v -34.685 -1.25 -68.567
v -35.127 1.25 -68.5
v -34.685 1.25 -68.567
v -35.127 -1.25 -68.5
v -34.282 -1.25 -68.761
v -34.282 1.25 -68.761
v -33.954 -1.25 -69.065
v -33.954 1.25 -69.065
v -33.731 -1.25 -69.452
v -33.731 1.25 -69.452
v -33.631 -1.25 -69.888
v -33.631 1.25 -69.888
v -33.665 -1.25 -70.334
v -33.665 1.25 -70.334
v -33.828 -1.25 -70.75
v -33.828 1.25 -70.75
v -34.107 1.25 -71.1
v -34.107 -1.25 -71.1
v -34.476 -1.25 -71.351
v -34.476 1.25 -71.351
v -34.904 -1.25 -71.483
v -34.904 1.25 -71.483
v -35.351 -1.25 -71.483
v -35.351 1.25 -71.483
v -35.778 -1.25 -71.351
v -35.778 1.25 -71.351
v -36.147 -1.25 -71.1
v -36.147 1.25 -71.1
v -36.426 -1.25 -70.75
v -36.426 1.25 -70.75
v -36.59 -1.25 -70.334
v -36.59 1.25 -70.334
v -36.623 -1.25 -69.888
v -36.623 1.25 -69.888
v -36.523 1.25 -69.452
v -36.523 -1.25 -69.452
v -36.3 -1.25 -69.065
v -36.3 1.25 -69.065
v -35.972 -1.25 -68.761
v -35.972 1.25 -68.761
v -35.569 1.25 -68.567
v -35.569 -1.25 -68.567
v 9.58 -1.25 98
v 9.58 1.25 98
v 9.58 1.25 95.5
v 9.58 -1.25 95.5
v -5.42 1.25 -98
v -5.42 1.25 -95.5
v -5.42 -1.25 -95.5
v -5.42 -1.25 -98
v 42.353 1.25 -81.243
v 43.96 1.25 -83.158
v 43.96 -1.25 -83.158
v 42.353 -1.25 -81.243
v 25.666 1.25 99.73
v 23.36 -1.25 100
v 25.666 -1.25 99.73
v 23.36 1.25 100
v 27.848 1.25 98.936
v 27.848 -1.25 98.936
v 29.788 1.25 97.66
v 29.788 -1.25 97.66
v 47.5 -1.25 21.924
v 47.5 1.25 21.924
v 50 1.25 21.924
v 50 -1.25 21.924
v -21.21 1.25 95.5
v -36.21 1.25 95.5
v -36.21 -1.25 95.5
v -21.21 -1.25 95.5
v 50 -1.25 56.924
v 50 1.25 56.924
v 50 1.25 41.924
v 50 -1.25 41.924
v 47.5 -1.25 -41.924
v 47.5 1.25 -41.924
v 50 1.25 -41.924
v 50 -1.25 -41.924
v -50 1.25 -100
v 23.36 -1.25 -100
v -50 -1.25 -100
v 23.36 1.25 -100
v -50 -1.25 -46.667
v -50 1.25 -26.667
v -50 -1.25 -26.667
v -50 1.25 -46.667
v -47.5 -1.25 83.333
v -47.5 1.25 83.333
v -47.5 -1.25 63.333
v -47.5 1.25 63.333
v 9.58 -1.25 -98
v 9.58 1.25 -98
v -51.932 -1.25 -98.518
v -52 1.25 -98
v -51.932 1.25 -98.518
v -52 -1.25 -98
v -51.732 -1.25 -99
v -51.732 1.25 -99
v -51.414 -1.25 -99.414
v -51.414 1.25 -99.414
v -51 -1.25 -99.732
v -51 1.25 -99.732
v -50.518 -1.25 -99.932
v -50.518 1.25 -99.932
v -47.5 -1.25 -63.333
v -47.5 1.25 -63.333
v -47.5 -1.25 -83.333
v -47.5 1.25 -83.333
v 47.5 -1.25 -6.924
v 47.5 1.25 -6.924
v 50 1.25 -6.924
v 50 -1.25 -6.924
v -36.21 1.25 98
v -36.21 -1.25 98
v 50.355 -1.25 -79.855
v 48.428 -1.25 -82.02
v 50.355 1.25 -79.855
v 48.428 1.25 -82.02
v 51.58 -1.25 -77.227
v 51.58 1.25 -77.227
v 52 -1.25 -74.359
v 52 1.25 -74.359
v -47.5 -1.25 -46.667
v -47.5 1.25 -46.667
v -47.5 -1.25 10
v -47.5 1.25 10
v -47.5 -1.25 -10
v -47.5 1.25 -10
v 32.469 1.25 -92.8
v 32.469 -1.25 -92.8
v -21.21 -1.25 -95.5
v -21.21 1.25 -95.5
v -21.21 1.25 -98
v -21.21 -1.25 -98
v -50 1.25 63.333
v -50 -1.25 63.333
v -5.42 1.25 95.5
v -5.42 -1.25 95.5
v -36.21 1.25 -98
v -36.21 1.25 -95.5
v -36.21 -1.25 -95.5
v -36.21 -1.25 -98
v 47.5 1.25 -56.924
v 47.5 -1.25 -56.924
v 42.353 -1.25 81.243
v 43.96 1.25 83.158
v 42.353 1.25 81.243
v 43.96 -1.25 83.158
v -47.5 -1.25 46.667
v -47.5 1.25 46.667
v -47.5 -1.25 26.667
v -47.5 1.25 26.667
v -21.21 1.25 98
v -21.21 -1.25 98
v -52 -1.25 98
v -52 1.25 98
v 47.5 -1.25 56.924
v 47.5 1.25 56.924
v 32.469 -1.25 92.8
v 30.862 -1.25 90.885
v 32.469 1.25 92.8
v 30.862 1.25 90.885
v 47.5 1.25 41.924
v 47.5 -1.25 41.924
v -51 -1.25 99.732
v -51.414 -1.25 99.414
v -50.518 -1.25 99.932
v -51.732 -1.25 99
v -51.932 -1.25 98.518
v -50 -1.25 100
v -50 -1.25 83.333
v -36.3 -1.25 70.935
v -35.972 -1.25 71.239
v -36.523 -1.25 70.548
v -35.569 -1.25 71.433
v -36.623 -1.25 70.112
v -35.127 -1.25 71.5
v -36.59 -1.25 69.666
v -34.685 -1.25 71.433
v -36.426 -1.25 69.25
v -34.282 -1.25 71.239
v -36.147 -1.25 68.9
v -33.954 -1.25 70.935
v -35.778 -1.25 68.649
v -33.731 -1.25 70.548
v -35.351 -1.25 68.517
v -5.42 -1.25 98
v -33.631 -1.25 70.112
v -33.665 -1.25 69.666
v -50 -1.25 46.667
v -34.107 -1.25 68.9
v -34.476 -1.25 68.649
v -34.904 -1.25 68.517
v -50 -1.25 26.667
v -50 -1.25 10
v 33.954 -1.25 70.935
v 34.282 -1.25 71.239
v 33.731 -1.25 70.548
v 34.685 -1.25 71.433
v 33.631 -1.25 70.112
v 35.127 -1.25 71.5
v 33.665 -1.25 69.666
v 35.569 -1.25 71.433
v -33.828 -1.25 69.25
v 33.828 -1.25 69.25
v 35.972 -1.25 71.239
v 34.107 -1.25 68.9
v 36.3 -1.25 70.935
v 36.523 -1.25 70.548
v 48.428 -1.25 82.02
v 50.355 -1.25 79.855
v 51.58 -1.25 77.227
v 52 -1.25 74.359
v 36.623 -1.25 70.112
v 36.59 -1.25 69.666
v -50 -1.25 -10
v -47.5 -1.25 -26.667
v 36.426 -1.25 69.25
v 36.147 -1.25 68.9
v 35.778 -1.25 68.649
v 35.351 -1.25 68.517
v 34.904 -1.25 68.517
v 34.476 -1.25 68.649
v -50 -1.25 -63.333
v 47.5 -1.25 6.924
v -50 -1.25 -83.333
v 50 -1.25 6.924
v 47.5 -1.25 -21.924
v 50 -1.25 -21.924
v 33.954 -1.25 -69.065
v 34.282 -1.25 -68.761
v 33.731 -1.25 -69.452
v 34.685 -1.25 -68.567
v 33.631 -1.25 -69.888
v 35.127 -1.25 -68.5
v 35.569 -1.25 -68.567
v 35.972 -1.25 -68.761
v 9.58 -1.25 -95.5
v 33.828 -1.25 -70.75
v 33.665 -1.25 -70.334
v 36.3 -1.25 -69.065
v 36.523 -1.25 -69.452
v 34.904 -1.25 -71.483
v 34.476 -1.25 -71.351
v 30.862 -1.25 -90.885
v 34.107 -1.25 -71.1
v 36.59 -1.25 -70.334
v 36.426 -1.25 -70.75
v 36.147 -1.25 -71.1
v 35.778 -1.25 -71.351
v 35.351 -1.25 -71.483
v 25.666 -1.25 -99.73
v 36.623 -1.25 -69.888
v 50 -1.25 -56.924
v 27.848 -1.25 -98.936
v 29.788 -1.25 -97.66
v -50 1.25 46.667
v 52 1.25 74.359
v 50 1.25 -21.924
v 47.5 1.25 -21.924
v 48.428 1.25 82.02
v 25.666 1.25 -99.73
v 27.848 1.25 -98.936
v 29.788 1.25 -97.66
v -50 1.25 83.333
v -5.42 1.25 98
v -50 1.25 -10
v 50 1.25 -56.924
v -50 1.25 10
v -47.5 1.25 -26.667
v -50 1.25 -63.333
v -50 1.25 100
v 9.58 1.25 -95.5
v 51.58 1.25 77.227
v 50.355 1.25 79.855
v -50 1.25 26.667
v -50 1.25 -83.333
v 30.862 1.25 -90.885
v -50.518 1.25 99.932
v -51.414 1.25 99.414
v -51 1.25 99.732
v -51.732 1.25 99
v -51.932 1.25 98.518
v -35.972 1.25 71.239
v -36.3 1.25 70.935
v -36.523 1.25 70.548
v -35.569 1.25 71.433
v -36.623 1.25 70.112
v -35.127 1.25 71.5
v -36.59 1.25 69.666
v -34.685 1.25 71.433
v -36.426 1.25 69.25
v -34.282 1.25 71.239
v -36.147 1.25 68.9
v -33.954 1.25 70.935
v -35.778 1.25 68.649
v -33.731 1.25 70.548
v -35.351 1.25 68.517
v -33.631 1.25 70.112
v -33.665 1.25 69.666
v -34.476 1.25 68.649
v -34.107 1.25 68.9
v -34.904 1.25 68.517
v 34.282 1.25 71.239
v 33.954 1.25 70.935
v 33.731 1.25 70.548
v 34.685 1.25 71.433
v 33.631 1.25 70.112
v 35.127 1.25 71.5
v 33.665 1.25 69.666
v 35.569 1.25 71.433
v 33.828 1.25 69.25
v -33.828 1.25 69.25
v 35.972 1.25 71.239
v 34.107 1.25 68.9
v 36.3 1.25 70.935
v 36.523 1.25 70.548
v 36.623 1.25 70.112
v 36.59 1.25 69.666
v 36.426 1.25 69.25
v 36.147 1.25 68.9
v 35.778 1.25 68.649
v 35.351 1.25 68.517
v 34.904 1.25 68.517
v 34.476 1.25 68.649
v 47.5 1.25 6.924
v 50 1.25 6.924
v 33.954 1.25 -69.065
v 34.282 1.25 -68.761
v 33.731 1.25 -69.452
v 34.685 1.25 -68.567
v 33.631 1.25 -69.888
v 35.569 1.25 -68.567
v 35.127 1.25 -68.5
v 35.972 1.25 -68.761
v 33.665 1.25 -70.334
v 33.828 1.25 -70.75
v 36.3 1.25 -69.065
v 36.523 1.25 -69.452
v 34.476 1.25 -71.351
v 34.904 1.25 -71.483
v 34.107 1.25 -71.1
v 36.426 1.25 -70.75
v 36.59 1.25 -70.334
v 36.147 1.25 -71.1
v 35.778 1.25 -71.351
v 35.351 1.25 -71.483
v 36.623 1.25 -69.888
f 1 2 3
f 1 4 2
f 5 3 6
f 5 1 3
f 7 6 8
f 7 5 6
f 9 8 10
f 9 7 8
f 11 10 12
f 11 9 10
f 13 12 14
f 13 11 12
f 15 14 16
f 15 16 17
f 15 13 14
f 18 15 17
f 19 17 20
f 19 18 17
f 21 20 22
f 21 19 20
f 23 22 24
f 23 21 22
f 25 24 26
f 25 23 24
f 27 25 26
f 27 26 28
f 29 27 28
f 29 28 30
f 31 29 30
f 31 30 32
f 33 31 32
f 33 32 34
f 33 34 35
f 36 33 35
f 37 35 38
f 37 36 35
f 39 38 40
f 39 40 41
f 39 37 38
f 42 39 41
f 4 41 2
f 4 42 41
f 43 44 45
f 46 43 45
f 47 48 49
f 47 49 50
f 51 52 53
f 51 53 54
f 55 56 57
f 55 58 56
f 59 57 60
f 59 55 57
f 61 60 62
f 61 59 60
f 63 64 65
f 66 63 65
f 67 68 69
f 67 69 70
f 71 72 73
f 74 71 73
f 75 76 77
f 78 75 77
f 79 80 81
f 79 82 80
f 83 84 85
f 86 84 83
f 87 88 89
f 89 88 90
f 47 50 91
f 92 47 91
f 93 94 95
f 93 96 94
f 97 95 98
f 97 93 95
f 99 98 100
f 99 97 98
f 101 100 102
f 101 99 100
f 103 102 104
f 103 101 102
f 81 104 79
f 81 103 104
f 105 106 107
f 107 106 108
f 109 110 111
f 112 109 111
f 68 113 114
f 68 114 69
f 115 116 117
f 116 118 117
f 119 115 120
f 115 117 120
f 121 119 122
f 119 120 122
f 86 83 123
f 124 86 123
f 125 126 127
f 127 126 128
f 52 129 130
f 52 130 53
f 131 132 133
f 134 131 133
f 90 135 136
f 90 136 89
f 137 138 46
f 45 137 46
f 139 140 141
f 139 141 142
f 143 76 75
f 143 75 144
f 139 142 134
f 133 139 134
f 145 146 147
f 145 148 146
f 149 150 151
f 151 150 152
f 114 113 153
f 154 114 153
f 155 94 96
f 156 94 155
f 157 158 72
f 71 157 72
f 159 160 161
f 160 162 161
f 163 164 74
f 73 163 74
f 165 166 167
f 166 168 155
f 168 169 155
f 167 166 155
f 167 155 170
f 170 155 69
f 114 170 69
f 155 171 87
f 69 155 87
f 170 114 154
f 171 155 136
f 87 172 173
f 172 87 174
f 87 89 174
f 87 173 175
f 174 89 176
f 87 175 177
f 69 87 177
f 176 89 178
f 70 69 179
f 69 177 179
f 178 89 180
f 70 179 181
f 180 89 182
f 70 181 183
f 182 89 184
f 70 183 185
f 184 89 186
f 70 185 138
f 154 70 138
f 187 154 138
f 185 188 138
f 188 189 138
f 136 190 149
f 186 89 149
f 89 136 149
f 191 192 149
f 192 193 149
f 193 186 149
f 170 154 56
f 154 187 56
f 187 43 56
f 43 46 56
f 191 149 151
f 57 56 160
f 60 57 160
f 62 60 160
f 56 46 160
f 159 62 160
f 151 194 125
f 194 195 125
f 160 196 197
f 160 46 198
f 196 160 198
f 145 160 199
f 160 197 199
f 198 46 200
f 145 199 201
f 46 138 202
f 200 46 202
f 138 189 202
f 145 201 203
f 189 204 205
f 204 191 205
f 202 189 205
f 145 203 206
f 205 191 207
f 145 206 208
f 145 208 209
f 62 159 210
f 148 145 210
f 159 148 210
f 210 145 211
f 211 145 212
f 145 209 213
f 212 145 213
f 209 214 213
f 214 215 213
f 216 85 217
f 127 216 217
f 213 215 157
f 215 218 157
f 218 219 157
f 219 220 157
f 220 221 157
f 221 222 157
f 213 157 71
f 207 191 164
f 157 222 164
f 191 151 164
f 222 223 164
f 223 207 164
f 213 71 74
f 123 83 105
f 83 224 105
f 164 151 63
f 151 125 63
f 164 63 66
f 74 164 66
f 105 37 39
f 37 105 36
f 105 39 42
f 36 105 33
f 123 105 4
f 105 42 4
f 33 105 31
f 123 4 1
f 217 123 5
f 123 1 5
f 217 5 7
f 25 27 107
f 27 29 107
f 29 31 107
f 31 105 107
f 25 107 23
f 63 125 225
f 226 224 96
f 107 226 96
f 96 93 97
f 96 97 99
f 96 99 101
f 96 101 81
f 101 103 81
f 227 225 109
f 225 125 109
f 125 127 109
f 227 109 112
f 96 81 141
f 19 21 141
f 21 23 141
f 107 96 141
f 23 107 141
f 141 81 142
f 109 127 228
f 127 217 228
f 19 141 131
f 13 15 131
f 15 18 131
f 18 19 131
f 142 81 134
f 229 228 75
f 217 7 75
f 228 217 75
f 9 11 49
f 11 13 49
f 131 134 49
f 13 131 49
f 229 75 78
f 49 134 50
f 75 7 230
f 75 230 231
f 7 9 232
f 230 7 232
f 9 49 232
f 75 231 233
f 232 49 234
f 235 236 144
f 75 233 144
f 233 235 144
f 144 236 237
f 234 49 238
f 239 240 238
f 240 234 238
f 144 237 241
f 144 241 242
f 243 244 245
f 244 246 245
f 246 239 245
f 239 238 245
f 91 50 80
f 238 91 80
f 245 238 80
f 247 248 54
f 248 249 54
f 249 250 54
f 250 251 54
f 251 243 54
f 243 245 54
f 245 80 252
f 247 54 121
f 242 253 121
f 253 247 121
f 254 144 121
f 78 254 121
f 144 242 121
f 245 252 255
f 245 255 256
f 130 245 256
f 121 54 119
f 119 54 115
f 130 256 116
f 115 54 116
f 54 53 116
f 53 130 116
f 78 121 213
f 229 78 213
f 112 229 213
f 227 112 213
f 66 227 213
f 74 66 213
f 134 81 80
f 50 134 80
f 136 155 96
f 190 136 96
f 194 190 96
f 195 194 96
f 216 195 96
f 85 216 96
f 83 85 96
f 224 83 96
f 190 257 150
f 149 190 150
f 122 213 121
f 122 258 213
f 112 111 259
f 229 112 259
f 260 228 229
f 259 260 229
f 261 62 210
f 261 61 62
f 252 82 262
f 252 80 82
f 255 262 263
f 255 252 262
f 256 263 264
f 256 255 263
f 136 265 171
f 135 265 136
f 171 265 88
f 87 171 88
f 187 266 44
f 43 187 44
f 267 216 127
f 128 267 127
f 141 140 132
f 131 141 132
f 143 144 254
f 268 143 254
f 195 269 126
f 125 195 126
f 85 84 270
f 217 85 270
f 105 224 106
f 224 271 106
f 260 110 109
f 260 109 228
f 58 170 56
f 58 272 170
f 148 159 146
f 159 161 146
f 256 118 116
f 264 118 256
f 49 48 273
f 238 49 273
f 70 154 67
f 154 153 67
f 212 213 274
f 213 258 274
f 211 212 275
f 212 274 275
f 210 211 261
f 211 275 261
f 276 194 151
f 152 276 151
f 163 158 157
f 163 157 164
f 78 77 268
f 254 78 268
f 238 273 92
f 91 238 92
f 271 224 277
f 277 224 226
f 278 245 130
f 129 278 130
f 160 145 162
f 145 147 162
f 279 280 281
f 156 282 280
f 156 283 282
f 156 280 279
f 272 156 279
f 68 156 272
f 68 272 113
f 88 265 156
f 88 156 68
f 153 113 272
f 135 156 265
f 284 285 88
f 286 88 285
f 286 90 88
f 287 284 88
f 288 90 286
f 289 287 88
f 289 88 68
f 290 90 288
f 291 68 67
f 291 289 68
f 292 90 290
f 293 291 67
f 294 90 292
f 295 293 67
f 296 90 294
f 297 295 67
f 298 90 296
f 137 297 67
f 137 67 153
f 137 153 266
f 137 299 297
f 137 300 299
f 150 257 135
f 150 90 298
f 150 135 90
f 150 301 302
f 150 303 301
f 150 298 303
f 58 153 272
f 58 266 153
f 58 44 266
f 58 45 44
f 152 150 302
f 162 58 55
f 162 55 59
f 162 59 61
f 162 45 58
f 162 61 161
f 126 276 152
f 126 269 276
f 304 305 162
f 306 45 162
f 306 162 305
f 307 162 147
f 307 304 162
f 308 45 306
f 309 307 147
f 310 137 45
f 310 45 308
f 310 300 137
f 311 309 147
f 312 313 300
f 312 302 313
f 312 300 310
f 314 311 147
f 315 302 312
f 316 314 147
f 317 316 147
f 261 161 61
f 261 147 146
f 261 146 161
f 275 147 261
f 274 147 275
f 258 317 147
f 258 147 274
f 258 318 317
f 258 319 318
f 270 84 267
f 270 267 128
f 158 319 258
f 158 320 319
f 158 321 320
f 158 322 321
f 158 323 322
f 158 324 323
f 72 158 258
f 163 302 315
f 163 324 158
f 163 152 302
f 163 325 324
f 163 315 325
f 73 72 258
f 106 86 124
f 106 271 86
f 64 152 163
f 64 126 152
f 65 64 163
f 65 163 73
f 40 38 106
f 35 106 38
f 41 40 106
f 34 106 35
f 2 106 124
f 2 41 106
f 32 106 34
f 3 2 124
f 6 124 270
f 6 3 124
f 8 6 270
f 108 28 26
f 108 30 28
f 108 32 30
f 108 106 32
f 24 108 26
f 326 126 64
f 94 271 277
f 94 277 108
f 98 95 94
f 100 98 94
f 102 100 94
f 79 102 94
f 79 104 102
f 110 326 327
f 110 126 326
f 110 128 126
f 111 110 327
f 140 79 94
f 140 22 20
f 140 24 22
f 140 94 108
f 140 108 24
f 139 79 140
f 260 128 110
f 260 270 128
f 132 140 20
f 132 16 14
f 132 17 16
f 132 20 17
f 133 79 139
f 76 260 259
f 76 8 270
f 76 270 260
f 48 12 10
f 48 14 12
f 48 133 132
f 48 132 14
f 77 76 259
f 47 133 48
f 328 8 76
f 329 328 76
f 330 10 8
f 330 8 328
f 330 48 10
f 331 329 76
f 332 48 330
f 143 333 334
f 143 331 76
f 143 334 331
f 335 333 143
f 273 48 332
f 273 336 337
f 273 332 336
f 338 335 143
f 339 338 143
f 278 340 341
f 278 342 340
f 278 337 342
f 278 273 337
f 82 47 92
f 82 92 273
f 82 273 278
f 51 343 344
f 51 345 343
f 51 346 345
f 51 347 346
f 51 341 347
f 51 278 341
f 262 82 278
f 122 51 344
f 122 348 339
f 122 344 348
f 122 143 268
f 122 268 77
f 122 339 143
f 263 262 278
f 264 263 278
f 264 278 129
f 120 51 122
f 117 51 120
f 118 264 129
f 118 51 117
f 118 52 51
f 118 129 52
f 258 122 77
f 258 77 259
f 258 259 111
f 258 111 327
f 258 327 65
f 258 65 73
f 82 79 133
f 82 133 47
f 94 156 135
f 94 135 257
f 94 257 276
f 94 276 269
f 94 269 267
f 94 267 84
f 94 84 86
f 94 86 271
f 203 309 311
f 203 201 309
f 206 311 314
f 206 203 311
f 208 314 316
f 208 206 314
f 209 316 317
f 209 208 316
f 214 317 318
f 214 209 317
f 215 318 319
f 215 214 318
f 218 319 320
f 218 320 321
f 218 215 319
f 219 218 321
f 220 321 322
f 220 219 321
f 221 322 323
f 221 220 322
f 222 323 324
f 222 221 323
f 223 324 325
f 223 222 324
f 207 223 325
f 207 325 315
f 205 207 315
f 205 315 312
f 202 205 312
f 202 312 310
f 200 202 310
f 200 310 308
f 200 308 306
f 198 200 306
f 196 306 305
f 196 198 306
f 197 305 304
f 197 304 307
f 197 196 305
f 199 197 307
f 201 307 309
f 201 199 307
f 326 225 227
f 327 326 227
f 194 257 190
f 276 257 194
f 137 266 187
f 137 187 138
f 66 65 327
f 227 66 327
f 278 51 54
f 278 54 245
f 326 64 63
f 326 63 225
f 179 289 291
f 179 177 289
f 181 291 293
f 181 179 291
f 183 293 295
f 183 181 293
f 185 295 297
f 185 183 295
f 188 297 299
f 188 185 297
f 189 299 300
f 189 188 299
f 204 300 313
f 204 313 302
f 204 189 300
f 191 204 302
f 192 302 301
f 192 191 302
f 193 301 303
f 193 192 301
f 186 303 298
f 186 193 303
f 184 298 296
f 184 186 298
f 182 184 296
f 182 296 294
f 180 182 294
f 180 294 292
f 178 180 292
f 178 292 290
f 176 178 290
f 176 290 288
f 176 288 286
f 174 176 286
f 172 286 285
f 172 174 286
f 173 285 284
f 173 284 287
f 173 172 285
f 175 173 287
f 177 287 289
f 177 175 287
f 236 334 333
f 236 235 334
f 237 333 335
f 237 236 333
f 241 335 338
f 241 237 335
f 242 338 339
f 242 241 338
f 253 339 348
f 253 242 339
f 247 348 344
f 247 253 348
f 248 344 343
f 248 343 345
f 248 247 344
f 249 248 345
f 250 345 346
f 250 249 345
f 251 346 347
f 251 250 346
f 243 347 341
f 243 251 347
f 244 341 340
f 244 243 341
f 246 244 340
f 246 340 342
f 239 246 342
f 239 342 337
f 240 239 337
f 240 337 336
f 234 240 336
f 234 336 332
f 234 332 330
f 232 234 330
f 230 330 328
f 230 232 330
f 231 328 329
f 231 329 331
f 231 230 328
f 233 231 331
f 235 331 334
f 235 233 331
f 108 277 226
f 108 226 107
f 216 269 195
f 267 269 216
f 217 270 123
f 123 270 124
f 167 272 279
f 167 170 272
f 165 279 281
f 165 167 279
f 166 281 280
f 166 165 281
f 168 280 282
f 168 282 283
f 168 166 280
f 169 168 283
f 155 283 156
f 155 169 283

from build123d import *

# Parameters (mm, degrees)
SKETCH1_R           = 1.5
SKETCH1_W           = 15
SKETCH1_H           = 2.5
SKETCH1_W_2         = 2.5
SKETCH1_H_2         = 15
SKETCH1_H_3         = 20
BOSS_EXTRUDE1_DEPTH = 1.25
FILLET1_R           = 10
FILLET2_R           = 2


with BuildPart() as part:
    # Sketch1 → Boss-Extrude1 (new, symmetric)
    with BuildSketch(Plane(origin=(0, 0, 0), x_dir=(1, 0, 0), z_dir=(0, 1, 0))):
        Polygon((-52, -100), (27, -100), (52, -79.022509221), (52, 79.022509221), (27, 100), (-52, 100), align=None)
        with Locations(Location((35.127158073, -70, 0), (0, 0, 270))):
            Circle(SKETCH1_R, mode=Mode.SUBTRACT)
        with Locations(Location((35.127158073, 70, 0), (0, 0, 270))):
            Circle(SKETCH1_R, mode=Mode.SUBTRACT)
        with Locations(Location((-35.127158073, 70, 0), (0, 0, 270))):
            Circle(SKETCH1_R, mode=Mode.SUBTRACT)
        with Locations(Location((-35.127158073, -70, 0), (0, 0, 270))):
            Circle(SKETCH1_R, mode=Mode.SUBTRACT)
        with Locations((-28.71, -96.75)):
            Rectangle(SKETCH1_W, SKETCH1_H, mode=Mode.SUBTRACT)
        with Locations((2.08, -96.75)):
            Rectangle(SKETCH1_W, SKETCH1_H, mode=Mode.SUBTRACT)
        with Locations((-28.71, 96.75)):
            Rectangle(SKETCH1_W, SKETCH1_H, mode=Mode.SUBTRACT)
        with Locations((2.08, 96.75)):
            Rectangle(SKETCH1_W, SKETCH1_H, mode=Mode.SUBTRACT)
        Polygon((30.862122433, -90.884961689), (32.469091457, -92.800072797), (43.959758104, -83.158258651), (42.35278908, -81.243147544), align=None, mode=Mode.SUBTRACT)
        with Locations((48.75, 14.424124759)):
            Rectangle(SKETCH1_W_2, SKETCH1_H_2, mode=Mode.SUBTRACT)
        with Locations((48.75, -49.424124759)):
            Rectangle(SKETCH1_W_2, SKETCH1_H_2, mode=Mode.SUBTRACT)
        with Locations((48.75, -14.424124759)):
            Rectangle(SKETCH1_W_2, SKETCH1_H_2, mode=Mode.SUBTRACT)
        with Locations((48.75, 49.424124759)):
            Rectangle(SKETCH1_W_2, SKETCH1_H_2, mode=Mode.SUBTRACT)
        Polygon((42.35278908, 81.243147544), (30.862122433, 90.884961689), (32.469091457, 92.800072797), (43.959758104, 83.158258651), align=None, mode=Mode.SUBTRACT)
        with Locations((-48.75, -36.666666667)):
            Rectangle(SKETCH1_W_2, SKETCH1_H_3, mode=Mode.SUBTRACT)
        with Locations((-48.75, -73.333333333)):
            Rectangle(SKETCH1_W_2, SKETCH1_H_3, mode=Mode.SUBTRACT)
        with Locations((-48.75, 0)):
            Rectangle(SKETCH1_W_2, SKETCH1_H_3, mode=Mode.SUBTRACT)
        with Locations((-48.75, 36.666666667)):
            Rectangle(SKETCH1_W_2, SKETCH1_H_3, mode=Mode.SUBTRACT)
        with Locations((-48.75, 73.333333333)):
            Rectangle(SKETCH1_W_2, SKETCH1_H_3, mode=Mode.SUBTRACT)
    extrude(amount=BOSS_EXTRUDE1_DEPTH, both=True)

    # Fillet1
    fillet1_edges = [part.edges().sort_by_distance(p)[0] for p in [
        (27, 0, -100),
        (52, 0, -79.022509221),
        (52, 0, 79.022509221),
        (27, 0, 100),
    ]]
    fillet(fillet1_edges, radius=FILLET1_R)

    # Fillet2
    fillet2_edges = [part.edges().sort_by_distance(p)[0] for p in [
        (-52, 0, 100),
        (-52, 0, -100),
    ]]
    fillet(fillet2_edges, radius=FILLET2_R)


solid = part.part
